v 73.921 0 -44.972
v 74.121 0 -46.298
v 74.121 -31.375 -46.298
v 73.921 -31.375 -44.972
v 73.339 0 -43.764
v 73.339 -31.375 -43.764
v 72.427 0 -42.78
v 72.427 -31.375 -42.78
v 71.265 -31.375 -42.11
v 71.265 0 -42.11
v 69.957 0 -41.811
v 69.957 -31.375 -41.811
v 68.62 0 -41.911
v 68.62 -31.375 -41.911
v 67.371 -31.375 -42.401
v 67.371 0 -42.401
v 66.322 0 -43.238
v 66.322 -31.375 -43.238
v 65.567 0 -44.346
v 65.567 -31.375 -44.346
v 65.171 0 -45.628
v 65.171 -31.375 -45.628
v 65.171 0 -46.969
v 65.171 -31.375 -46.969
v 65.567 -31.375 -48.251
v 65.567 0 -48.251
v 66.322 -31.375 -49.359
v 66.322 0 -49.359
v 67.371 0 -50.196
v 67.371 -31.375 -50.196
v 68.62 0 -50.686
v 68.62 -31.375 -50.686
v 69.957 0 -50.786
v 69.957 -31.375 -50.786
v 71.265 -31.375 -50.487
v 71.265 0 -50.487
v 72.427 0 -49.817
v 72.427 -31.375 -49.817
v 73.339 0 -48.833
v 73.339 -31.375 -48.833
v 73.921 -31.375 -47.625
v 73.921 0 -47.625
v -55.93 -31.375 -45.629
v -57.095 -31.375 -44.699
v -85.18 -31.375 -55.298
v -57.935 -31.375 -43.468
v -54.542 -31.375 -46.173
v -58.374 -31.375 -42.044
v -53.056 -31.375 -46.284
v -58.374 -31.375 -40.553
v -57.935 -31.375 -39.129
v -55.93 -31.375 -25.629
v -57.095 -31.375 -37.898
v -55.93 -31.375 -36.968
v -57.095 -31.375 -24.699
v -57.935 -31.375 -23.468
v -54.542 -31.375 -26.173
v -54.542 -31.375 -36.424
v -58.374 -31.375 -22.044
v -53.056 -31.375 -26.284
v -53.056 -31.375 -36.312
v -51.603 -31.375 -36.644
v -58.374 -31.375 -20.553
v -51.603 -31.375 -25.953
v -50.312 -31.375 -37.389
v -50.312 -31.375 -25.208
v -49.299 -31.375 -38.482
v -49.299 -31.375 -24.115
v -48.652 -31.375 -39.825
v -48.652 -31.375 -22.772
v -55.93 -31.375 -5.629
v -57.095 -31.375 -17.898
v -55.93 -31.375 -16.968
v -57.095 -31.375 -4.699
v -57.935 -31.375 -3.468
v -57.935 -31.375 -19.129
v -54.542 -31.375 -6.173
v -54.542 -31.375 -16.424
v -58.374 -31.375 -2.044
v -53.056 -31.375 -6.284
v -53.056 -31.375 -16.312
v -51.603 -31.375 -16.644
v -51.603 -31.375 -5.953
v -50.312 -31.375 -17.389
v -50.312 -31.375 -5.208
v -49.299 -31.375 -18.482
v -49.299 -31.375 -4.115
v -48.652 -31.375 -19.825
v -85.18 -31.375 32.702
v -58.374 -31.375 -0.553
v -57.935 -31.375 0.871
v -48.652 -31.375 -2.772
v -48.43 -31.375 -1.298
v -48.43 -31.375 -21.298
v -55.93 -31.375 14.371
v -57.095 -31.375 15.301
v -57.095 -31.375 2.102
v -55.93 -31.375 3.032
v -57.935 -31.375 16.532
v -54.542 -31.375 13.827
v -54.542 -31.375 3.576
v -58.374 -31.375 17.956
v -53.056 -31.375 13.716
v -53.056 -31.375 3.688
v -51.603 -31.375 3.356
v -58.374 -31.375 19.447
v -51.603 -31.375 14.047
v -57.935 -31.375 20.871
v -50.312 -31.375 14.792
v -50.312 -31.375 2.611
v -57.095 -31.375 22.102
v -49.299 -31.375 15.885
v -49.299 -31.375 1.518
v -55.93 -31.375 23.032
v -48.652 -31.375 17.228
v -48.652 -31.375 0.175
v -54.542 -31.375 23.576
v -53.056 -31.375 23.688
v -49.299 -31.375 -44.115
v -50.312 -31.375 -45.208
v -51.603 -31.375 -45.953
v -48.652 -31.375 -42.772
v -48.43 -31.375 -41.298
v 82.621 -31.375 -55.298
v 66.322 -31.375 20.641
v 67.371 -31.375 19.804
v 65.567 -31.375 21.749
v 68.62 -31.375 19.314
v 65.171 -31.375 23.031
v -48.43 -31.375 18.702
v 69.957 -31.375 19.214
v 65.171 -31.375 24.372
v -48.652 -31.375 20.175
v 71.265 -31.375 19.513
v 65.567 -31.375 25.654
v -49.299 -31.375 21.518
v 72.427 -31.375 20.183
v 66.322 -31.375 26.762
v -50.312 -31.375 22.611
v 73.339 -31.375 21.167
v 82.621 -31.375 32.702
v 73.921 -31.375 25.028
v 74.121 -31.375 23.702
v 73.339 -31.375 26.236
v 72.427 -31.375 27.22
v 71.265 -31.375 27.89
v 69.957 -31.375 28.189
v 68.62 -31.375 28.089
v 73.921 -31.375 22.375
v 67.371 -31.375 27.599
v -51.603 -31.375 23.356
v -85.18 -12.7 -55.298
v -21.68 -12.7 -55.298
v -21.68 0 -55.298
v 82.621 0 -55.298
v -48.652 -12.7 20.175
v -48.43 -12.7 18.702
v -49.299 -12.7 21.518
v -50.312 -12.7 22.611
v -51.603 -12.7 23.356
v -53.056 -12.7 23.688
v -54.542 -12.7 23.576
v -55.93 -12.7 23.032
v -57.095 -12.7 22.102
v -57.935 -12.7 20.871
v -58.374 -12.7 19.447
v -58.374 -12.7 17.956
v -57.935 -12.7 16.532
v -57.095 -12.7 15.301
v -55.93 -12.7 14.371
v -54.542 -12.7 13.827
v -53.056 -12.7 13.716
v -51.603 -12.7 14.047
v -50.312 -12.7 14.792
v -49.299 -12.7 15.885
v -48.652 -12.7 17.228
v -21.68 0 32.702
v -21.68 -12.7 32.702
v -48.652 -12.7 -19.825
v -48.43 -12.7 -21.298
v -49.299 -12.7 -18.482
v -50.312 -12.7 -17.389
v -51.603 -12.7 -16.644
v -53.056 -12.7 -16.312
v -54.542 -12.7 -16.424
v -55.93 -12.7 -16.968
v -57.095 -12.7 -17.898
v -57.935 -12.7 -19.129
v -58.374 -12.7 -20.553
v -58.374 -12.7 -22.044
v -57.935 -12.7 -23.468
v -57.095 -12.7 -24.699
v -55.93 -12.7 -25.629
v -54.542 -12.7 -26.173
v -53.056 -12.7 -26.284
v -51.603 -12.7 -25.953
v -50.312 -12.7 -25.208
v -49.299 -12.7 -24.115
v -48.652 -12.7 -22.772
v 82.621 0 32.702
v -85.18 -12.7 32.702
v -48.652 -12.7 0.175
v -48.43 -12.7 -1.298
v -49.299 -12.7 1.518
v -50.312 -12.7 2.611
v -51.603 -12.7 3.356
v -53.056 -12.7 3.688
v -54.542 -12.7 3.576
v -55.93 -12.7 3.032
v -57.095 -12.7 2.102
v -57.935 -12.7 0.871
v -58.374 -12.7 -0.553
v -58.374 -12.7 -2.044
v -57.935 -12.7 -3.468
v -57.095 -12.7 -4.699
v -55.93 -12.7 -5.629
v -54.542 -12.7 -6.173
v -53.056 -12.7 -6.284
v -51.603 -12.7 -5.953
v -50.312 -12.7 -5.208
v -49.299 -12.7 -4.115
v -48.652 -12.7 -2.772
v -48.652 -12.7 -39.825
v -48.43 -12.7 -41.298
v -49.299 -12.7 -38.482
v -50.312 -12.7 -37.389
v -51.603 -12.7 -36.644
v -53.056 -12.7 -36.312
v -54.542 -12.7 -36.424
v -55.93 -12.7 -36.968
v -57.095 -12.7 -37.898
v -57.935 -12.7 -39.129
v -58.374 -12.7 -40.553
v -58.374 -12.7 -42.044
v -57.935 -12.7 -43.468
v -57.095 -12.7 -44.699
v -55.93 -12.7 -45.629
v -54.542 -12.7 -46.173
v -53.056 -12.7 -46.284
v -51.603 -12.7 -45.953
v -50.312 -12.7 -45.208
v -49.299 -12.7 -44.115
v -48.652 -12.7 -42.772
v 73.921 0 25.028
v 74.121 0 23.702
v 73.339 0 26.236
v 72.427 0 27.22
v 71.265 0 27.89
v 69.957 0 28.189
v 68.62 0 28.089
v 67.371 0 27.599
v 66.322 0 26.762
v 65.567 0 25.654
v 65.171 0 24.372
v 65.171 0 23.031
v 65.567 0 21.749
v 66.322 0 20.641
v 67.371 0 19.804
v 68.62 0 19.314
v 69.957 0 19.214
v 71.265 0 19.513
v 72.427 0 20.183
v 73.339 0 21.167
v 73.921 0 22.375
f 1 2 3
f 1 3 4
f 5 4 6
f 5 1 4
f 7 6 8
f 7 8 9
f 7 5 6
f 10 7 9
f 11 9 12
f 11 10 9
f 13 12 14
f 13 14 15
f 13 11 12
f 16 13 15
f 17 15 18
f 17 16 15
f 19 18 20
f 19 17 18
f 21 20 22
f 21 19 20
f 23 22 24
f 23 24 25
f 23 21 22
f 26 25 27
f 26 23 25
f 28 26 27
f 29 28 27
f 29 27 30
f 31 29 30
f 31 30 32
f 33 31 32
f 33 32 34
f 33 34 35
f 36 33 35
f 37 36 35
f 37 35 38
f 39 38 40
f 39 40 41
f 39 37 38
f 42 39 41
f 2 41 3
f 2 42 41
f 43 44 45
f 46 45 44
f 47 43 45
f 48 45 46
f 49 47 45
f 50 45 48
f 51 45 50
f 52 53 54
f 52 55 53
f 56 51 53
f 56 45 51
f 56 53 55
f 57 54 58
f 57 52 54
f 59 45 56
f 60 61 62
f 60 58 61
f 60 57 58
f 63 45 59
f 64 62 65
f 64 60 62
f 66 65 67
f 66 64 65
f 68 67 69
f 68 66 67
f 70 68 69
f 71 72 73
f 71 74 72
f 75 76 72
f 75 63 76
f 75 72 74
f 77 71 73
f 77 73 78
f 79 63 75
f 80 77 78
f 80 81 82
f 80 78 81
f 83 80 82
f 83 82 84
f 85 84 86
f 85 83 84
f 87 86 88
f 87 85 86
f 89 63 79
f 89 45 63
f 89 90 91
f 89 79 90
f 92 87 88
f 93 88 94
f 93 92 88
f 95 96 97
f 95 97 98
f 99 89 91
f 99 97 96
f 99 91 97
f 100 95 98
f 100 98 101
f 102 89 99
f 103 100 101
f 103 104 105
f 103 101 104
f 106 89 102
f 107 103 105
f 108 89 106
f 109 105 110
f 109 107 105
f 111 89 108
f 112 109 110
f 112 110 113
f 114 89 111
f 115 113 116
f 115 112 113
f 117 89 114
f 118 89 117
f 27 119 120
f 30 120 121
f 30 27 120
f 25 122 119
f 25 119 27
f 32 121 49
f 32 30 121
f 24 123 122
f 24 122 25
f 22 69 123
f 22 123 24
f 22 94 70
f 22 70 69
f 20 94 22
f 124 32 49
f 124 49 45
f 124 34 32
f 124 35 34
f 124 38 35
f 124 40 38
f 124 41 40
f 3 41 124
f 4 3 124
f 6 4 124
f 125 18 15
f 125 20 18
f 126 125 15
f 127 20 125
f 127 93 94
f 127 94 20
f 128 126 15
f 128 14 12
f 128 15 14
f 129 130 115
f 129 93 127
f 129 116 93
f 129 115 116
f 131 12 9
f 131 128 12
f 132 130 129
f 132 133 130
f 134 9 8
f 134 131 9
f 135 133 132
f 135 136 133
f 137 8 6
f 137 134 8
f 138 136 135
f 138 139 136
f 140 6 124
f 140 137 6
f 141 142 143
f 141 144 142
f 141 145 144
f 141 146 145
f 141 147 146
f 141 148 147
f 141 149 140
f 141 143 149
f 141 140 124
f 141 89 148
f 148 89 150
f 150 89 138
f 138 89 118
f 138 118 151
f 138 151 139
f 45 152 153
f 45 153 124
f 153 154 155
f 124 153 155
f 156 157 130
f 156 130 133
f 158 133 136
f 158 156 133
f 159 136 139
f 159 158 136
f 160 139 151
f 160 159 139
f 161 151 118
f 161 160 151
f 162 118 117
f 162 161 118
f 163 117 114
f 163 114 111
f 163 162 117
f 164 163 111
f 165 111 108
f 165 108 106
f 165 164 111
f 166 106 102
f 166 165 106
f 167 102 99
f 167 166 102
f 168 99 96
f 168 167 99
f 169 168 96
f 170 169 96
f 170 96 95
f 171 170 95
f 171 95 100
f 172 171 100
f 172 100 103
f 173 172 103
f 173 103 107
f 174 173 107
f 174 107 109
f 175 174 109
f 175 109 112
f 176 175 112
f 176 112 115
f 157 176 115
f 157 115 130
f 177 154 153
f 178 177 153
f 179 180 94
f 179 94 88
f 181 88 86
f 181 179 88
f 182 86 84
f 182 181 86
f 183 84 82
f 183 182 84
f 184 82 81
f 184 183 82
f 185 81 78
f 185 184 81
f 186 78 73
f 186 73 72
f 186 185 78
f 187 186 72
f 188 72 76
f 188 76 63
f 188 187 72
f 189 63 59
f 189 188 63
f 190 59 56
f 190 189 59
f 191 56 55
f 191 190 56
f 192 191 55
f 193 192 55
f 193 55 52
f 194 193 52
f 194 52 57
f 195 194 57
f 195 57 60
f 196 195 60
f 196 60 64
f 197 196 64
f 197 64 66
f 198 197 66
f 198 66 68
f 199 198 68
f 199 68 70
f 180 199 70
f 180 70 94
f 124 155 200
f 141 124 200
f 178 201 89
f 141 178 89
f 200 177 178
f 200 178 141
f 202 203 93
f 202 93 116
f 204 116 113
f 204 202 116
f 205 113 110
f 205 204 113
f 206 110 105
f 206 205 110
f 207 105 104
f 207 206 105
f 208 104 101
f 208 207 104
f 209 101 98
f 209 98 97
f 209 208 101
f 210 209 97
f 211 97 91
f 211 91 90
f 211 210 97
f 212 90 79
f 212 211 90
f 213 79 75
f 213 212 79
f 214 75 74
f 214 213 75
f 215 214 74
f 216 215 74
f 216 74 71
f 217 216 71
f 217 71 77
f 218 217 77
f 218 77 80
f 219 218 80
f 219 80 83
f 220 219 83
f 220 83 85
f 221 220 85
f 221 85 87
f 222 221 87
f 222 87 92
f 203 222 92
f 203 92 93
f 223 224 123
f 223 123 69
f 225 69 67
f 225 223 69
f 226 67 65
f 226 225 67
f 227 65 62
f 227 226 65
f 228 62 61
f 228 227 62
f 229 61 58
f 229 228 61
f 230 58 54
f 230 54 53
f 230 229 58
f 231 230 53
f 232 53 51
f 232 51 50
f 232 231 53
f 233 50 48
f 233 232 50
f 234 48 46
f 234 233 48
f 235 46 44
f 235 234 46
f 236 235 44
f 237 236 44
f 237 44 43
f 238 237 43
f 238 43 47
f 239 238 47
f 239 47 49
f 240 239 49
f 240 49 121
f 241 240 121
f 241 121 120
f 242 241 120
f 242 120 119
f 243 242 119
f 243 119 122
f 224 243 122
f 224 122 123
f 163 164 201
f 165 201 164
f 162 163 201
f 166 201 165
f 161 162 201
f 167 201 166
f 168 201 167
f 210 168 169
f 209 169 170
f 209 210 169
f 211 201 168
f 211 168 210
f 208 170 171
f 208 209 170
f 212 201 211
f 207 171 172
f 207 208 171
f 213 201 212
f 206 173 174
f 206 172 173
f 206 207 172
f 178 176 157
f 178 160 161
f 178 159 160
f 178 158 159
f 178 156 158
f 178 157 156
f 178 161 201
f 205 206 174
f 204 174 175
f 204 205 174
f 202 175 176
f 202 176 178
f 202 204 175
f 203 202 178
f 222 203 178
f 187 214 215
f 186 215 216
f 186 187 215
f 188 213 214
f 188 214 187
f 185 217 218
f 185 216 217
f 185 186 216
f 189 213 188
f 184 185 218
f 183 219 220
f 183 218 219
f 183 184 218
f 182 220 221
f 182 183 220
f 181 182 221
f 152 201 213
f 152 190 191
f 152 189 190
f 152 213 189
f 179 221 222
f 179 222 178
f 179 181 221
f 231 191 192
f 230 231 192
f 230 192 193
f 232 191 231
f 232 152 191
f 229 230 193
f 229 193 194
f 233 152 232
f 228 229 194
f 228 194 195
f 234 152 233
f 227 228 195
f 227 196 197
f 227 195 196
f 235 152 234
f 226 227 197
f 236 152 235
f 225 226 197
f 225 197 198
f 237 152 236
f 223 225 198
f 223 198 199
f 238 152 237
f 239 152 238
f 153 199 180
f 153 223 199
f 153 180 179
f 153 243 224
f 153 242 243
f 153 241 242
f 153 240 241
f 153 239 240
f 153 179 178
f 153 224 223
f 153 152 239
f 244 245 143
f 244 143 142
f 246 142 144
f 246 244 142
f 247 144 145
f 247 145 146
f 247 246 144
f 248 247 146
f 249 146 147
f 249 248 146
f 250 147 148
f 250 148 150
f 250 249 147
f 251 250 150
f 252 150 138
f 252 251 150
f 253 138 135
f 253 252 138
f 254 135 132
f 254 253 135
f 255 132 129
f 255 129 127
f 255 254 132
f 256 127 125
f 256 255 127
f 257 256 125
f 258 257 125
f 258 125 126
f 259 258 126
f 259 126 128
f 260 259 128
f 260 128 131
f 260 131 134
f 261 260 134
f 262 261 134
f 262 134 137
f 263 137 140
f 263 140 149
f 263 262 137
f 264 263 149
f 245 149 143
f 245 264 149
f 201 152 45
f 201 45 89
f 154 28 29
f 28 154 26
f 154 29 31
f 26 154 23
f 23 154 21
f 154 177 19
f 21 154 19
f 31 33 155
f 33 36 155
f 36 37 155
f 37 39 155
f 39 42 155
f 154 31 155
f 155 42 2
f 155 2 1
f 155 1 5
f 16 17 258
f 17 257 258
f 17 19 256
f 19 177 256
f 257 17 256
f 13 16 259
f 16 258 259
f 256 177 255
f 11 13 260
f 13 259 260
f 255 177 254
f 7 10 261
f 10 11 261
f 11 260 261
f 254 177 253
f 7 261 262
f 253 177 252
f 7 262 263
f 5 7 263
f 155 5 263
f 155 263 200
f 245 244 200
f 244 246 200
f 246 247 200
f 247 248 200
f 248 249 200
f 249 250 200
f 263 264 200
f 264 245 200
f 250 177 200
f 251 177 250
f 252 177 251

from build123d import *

# Parameters (mm, degrees)
F0_W     = 167.801
F0_H     = 88
F0_R     = 5
F0_R_2   = 4.5
F1_DEPTH = 31.375
F2_W     = 63.5
F2_H     = 12.7
F3_DEPTH = 88.001


with BuildPart() as f1:
    # F0 (on Front) → F1 (new body)
    with BuildSketch(Plane.XZ):
        with Locations((-1.279364, -11.298474)):
            Rectangle(F0_W, F0_H)
        with Locations((-53.429864, -41.298474)):
            Circle(F0_R, mode=Mode.SUBTRACT)
        with Locations((-53.429864, -21.298474)):
            Circle(F0_R, mode=Mode.SUBTRACT)
        with Locations((69.621136, -46.298474)):
            Circle(F0_R_2, mode=Mode.SUBTRACT)
        with Locations((-53.429864, -1.298474)):
            Circle(F0_R, mode=Mode.SUBTRACT)
        with Locations((-53.429864, 18.701526)):
            Circle(F0_R, mode=Mode.SUBTRACT)
        with Locations((69.621136, 23.701526)):
            Circle(F0_R_2, mode=Mode.SUBTRACT)
    extrude(amount=F1_DEPTH)

    # F2 (on face) → F3 (cut, through all)
    with BuildSketch(Plane(origin=(0, 0, -55.298474), x_dir=(1, 0, 0), z_dir=(0, 0, -1))):
        with Locations((-53.429864, 6.35)):
            Rectangle(F2_W, F2_H)
    extrude(amount=-F3_DEPTH, mode=Mode.SUBTRACT)


solid = f1.part
